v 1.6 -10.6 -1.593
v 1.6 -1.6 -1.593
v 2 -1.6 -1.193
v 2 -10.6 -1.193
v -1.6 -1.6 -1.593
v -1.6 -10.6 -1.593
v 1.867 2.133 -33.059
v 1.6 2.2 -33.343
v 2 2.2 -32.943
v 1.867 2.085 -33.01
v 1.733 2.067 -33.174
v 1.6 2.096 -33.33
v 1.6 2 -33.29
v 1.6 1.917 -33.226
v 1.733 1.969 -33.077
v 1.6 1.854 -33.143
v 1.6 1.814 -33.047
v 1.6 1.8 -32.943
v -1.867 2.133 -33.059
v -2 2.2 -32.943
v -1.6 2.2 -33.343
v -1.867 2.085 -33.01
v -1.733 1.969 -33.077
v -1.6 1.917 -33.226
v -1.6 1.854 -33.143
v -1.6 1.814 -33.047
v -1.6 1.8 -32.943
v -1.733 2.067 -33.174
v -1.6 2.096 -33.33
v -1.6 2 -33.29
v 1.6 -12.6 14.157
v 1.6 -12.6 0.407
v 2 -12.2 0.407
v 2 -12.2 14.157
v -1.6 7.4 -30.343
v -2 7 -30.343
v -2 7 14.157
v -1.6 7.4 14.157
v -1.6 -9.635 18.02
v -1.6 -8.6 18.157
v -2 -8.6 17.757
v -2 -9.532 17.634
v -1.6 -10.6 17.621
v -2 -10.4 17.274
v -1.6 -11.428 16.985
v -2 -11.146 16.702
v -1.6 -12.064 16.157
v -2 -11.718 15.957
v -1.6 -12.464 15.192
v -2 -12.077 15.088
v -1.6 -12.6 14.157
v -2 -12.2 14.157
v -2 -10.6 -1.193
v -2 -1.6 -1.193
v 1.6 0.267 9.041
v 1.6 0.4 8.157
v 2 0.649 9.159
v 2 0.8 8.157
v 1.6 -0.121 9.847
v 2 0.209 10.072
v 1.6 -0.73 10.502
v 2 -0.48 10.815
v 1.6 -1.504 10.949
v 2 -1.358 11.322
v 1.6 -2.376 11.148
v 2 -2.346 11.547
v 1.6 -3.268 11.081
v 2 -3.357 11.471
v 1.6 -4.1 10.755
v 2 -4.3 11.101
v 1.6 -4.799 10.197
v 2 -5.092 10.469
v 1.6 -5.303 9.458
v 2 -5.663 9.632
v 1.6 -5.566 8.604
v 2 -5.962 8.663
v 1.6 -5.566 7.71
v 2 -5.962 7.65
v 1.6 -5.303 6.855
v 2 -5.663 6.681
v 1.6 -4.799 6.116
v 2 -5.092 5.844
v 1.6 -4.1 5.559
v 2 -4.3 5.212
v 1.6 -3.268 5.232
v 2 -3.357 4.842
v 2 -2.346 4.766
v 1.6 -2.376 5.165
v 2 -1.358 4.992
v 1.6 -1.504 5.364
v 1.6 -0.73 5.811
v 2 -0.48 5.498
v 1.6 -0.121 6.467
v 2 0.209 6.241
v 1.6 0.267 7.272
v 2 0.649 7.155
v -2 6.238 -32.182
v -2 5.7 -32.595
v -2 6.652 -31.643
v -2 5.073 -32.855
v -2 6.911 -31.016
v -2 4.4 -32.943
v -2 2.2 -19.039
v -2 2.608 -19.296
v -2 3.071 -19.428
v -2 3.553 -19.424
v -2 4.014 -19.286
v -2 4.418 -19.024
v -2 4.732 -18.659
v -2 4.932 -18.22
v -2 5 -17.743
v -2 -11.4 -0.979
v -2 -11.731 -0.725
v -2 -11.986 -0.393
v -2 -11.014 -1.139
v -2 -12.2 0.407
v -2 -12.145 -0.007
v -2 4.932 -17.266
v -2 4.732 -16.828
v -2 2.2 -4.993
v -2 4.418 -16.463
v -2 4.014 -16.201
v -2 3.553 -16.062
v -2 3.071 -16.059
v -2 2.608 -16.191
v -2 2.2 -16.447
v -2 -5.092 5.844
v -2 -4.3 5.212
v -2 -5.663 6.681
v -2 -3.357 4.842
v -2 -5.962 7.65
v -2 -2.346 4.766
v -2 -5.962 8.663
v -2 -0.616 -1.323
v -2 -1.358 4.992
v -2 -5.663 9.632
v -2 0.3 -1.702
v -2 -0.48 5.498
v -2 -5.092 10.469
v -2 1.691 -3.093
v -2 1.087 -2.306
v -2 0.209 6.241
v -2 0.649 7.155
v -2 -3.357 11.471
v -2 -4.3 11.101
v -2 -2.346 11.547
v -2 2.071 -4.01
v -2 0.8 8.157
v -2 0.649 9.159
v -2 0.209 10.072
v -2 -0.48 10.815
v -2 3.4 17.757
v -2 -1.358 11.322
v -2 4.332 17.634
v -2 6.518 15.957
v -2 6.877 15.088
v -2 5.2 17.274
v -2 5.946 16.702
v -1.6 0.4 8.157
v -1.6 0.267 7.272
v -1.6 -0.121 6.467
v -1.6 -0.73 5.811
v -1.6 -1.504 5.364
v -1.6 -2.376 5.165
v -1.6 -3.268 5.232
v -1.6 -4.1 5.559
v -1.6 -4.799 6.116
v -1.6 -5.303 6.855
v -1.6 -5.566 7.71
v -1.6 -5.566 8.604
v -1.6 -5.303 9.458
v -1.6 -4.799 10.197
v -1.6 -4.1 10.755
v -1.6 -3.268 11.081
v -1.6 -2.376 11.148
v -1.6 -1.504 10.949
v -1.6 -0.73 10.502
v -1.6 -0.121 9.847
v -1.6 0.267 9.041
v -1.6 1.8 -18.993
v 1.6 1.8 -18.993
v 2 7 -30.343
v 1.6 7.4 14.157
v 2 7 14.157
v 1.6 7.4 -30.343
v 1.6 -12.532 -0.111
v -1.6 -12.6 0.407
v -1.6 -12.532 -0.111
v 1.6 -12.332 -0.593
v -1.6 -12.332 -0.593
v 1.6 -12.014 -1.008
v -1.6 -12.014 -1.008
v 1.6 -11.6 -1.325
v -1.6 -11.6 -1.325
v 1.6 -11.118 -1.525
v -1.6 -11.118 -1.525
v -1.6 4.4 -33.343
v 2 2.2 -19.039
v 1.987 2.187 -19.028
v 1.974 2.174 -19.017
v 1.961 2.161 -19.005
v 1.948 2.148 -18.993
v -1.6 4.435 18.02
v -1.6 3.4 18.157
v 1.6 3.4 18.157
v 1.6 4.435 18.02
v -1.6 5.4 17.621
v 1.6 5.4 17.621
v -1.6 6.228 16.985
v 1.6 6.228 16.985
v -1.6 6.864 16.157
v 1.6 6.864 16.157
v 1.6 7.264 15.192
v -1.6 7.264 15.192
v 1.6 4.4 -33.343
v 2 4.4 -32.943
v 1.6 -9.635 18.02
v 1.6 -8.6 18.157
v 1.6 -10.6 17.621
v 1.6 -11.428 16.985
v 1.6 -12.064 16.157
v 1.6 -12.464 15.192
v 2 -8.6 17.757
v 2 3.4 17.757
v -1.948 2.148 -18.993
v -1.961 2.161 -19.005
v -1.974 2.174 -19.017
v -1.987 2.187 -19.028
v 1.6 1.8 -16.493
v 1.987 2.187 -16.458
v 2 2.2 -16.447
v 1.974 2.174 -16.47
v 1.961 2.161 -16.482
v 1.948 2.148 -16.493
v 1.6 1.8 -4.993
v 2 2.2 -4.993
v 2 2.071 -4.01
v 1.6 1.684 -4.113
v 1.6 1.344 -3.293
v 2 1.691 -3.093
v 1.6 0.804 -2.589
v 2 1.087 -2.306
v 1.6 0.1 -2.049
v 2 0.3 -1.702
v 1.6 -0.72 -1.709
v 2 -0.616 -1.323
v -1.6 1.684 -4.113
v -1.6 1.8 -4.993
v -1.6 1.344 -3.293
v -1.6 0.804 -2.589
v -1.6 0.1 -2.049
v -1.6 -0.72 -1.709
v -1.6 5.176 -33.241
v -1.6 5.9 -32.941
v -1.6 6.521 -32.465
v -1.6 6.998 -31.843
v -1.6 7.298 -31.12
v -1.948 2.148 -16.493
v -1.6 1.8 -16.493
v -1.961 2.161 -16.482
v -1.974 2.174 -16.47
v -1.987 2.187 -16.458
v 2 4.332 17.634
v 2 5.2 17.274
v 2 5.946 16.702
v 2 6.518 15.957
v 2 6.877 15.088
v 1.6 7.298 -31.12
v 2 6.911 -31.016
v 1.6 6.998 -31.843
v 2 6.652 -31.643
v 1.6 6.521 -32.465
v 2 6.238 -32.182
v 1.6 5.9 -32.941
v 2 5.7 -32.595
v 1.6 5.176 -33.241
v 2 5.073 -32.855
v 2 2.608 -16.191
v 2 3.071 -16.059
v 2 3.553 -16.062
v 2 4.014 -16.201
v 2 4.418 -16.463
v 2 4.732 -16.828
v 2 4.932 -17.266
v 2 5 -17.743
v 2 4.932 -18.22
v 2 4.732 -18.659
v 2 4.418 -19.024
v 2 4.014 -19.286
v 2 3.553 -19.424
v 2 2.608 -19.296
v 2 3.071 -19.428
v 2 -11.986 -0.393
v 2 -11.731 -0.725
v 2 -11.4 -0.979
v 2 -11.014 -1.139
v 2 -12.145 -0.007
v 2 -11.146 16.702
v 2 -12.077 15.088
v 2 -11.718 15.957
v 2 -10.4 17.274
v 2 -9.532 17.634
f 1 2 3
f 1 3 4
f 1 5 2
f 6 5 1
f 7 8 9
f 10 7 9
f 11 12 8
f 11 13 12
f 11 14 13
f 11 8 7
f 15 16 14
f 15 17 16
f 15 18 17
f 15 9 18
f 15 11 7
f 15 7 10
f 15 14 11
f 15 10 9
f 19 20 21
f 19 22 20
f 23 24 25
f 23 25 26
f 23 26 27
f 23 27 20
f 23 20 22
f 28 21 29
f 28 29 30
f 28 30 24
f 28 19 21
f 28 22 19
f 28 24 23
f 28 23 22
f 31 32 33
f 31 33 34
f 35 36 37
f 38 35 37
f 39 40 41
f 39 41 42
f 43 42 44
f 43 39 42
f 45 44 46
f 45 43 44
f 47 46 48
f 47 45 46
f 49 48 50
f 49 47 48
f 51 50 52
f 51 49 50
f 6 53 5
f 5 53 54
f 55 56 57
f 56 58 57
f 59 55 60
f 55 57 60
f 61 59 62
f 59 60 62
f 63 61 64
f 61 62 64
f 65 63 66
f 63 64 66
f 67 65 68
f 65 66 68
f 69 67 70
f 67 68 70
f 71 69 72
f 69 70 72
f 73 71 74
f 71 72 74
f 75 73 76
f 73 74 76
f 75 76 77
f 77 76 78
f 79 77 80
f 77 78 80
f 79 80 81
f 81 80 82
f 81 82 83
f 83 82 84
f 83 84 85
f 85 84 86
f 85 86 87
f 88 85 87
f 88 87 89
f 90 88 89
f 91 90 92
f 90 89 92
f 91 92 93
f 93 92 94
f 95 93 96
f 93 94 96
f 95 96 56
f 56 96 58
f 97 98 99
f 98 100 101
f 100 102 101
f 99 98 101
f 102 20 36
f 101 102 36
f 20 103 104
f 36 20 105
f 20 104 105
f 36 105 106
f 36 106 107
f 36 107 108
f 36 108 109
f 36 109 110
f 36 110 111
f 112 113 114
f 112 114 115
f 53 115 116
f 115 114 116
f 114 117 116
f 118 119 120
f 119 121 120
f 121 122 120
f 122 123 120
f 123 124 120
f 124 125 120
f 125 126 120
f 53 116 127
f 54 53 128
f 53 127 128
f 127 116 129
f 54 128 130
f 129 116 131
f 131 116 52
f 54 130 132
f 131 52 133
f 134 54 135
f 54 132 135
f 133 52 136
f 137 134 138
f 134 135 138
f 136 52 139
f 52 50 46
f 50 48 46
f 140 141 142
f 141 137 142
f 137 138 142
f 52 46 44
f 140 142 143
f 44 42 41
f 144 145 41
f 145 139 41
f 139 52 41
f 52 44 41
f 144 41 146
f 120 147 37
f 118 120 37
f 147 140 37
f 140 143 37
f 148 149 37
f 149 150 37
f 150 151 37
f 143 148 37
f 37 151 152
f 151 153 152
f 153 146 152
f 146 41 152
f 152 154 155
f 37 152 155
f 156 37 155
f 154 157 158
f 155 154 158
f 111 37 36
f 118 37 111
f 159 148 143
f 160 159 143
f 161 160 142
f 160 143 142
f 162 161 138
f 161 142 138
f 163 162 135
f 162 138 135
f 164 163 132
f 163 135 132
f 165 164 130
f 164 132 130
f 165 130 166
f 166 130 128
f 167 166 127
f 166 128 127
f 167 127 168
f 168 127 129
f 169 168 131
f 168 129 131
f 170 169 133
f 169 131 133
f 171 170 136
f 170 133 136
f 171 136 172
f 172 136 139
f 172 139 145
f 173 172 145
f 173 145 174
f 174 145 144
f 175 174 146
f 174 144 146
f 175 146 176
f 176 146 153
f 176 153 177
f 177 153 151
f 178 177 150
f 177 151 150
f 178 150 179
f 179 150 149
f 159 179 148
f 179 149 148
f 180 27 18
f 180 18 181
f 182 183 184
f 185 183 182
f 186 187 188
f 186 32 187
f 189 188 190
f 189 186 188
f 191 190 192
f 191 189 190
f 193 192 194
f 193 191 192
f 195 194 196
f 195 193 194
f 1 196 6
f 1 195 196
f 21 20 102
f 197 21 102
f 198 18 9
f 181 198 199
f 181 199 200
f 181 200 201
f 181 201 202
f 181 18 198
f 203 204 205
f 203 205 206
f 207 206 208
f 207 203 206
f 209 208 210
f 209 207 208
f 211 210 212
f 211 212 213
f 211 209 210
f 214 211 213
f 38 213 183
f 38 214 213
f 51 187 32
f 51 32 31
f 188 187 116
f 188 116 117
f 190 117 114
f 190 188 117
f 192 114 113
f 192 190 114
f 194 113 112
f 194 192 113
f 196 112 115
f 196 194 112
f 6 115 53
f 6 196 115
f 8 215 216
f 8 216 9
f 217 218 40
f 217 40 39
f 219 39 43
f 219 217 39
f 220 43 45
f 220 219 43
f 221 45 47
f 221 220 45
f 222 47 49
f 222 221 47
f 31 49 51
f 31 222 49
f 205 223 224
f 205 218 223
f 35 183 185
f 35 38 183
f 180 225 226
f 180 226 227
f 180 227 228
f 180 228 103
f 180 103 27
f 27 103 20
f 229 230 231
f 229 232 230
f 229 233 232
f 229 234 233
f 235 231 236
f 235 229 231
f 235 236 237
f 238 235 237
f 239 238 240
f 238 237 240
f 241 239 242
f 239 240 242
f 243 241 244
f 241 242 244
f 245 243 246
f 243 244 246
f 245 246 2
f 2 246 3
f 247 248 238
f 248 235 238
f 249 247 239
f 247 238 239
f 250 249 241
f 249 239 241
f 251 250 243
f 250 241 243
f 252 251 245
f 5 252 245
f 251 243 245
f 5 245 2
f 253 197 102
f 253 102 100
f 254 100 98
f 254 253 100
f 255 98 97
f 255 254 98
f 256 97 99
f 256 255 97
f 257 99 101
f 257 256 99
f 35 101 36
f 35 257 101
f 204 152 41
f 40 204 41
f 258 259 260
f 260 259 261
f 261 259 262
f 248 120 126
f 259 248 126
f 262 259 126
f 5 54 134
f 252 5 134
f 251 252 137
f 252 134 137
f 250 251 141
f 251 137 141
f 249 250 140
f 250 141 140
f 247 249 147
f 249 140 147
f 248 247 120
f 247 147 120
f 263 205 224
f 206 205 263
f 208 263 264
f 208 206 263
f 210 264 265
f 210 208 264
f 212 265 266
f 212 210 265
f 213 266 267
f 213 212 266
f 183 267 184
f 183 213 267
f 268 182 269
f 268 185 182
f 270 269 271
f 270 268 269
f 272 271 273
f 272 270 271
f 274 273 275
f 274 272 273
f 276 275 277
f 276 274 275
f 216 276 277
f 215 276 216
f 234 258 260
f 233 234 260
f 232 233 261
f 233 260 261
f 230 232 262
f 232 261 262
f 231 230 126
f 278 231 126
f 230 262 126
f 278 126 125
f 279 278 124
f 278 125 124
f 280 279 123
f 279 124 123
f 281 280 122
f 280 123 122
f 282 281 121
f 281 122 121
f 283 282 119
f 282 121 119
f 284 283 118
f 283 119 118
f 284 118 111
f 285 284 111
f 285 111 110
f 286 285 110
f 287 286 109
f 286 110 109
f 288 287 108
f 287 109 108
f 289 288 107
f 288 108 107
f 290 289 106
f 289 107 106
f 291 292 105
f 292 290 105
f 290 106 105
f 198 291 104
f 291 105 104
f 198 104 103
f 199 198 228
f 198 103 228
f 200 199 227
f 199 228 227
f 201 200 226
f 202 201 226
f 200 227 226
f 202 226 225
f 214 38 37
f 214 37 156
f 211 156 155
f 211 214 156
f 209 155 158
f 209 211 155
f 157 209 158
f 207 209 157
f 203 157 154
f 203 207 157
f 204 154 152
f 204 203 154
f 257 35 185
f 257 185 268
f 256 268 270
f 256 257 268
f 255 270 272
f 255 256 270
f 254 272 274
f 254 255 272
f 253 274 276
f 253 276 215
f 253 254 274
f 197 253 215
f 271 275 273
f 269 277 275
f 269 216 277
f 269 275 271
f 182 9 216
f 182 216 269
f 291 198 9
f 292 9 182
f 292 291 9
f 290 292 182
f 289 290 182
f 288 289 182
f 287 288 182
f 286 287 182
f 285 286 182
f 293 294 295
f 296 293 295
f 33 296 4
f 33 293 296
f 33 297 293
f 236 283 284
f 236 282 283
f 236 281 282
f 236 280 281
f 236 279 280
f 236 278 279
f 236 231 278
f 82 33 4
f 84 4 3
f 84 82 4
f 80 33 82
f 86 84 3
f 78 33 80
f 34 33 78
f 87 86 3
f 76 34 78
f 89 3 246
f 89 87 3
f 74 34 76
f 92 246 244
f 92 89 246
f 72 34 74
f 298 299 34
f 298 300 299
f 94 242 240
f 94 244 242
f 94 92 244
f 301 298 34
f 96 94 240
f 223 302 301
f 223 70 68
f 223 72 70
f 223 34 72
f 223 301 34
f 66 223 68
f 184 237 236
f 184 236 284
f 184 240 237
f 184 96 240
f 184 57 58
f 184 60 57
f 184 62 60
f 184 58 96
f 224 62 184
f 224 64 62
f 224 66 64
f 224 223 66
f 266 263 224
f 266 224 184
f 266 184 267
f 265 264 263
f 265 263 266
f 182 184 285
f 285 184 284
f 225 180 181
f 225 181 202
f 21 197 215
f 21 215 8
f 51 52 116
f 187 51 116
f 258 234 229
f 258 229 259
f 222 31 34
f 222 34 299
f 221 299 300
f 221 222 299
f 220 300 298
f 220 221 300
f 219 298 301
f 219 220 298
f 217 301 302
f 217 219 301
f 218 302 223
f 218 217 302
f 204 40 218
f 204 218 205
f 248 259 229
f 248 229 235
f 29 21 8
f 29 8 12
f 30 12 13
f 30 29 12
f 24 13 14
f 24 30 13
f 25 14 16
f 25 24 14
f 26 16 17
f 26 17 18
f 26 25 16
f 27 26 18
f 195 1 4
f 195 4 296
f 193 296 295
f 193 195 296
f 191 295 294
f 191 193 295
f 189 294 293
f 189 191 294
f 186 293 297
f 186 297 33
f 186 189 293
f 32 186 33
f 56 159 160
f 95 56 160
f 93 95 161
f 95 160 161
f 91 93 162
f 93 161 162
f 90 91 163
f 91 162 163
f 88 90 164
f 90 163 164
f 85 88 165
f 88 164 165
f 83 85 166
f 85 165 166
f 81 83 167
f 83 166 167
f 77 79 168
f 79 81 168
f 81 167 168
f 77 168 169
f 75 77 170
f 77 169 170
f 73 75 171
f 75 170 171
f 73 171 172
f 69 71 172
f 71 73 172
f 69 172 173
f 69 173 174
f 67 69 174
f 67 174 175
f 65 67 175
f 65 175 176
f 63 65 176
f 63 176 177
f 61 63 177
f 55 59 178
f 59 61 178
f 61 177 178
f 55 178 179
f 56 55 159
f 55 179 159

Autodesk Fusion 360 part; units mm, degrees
sketch "Sketch1" plane through (0, 0, 0) normal (1, 0, 0) x (0, 1, 0)
  line L0 (-12.6, 18.1567) -> (7.4, 18.1567)
  line L1 (7.4, 18.1567) -> (7.4, -33.3433)
  line L2 (7.4, -33.3433) -> (1.8, -33.3433)
  line L3 (1.8, -1.5933) -> (-12.6, -1.5933)
  line L4 (-12.6, -1.5933) -> (-12.6, 18.1567)
  circle A0 centre (-2.6, 8.1567) radius 3
  line L5 (7.4, 18.1567) -> (-2.6, 8.1567) construction
  line L6 (-12.6, 18.1567) -> (-2.6, 8.1567) construction
  arc A1 (1.8, -18.5433) -> (1.8, -16.9433) centre (3.3, -17.7433) ccw
  line L7 (1.8, -33.3433) -> (1.8, -18.5433)
  line L8 (1.8, -16.9433) -> (1.8, -1.5933)
  line L9 (2.244, -16.4933) -> (1.356, -16.4933)
  line L10 (1.356, -16.4933) -> (1.356, -18.9933)
  line L11 (1.356, -18.9933) -> (2.244, -18.9933)
  line L12 (2.244, -18.9933) -> (2.244, -16.4933)
  line L13 (2.244, -16.4933) -> (1.356, -18.9933) construction
  line L14 (1.356, -16.4933) -> (2.244, -18.9933) construction
  line L15 (3.3, -17.7433) -> (-0.8, -17.7433) construction
  point P0 (1.8, -17.7433)
  dimension "d1" = 20
  dimension "d2" = 19.75
  dimension "d3" = 6
  dimension "d4" = 45
  dimension "d5" = 45
  dimension "d6" = 5.6
  dimension "d7" = 3.4
  dimension "d8" = 15.6
  dimension "d10" = 1.5
  dimension "d24" = 31.75
  dimension "d25" = 8.1567
  dimension "d26" = 2.5
extrude "Extrude1" add sketch "Sketch1" along normal mid plane 4 contours L0 L1 L2 L3 L4 A1 L7 L8 L9 L11
fillet "Fillet1" radius 4 2 edges at (0, -12.6, 18.1567) (0, 7.4, 18.1567)
fillet "Fillet2" radius 2 1 edges at (0, -12.6, -1.5933)
fillet "Fillet3" radius 3.4 1 edges at (0, 1.8, -1.5933)
fillet "Fillet4" radius 0.4 1 edges at (0, 1.8, -33.3433)
fillet "Fillet5" radius 3 1 edges at (0, 7.4, -33.3433)
chamfer "Chamfer1" distance 0.4 angle 45 28 edges at (2, -2.6, 18.1567) (2, -11.4284, 16.9851) (2, -12.6, 7.2817) (2, -12.0142, -1.0075) (2, -6.1, -1.5933) (2, 0.8042, -2.5891) (2, 1.8, -10.7433) (2, 1.8, -25.9683) (2, 1.9172, -33.2261) (2, 3.3, -33.3433) (2, 6.5213, -32.4646) (2, 7.4, -8.0933) (2, 6.2284, 16.9851) (2, -5.397, 9.2416) (-2, -2.6, 18.1567) (-2, 6.2284, 16.9851) (-2, 7.4, -8.0933) (-2, 6.5213, -32.4646) (-2, 3.3, -33.3433) (-2, 1.9172, -33.2261) (-2, 1.8, -25.9683) (-2, 1.8, -10.7433) (-2, 0.8042, -2.5891) (-2, -6.1, -1.5933) (-2, -12.0142, -1.0075) (-2, -12.6, 7.2817) (-2, -11.4284, 16.9851) (-2, -5.397, 7.0719)
